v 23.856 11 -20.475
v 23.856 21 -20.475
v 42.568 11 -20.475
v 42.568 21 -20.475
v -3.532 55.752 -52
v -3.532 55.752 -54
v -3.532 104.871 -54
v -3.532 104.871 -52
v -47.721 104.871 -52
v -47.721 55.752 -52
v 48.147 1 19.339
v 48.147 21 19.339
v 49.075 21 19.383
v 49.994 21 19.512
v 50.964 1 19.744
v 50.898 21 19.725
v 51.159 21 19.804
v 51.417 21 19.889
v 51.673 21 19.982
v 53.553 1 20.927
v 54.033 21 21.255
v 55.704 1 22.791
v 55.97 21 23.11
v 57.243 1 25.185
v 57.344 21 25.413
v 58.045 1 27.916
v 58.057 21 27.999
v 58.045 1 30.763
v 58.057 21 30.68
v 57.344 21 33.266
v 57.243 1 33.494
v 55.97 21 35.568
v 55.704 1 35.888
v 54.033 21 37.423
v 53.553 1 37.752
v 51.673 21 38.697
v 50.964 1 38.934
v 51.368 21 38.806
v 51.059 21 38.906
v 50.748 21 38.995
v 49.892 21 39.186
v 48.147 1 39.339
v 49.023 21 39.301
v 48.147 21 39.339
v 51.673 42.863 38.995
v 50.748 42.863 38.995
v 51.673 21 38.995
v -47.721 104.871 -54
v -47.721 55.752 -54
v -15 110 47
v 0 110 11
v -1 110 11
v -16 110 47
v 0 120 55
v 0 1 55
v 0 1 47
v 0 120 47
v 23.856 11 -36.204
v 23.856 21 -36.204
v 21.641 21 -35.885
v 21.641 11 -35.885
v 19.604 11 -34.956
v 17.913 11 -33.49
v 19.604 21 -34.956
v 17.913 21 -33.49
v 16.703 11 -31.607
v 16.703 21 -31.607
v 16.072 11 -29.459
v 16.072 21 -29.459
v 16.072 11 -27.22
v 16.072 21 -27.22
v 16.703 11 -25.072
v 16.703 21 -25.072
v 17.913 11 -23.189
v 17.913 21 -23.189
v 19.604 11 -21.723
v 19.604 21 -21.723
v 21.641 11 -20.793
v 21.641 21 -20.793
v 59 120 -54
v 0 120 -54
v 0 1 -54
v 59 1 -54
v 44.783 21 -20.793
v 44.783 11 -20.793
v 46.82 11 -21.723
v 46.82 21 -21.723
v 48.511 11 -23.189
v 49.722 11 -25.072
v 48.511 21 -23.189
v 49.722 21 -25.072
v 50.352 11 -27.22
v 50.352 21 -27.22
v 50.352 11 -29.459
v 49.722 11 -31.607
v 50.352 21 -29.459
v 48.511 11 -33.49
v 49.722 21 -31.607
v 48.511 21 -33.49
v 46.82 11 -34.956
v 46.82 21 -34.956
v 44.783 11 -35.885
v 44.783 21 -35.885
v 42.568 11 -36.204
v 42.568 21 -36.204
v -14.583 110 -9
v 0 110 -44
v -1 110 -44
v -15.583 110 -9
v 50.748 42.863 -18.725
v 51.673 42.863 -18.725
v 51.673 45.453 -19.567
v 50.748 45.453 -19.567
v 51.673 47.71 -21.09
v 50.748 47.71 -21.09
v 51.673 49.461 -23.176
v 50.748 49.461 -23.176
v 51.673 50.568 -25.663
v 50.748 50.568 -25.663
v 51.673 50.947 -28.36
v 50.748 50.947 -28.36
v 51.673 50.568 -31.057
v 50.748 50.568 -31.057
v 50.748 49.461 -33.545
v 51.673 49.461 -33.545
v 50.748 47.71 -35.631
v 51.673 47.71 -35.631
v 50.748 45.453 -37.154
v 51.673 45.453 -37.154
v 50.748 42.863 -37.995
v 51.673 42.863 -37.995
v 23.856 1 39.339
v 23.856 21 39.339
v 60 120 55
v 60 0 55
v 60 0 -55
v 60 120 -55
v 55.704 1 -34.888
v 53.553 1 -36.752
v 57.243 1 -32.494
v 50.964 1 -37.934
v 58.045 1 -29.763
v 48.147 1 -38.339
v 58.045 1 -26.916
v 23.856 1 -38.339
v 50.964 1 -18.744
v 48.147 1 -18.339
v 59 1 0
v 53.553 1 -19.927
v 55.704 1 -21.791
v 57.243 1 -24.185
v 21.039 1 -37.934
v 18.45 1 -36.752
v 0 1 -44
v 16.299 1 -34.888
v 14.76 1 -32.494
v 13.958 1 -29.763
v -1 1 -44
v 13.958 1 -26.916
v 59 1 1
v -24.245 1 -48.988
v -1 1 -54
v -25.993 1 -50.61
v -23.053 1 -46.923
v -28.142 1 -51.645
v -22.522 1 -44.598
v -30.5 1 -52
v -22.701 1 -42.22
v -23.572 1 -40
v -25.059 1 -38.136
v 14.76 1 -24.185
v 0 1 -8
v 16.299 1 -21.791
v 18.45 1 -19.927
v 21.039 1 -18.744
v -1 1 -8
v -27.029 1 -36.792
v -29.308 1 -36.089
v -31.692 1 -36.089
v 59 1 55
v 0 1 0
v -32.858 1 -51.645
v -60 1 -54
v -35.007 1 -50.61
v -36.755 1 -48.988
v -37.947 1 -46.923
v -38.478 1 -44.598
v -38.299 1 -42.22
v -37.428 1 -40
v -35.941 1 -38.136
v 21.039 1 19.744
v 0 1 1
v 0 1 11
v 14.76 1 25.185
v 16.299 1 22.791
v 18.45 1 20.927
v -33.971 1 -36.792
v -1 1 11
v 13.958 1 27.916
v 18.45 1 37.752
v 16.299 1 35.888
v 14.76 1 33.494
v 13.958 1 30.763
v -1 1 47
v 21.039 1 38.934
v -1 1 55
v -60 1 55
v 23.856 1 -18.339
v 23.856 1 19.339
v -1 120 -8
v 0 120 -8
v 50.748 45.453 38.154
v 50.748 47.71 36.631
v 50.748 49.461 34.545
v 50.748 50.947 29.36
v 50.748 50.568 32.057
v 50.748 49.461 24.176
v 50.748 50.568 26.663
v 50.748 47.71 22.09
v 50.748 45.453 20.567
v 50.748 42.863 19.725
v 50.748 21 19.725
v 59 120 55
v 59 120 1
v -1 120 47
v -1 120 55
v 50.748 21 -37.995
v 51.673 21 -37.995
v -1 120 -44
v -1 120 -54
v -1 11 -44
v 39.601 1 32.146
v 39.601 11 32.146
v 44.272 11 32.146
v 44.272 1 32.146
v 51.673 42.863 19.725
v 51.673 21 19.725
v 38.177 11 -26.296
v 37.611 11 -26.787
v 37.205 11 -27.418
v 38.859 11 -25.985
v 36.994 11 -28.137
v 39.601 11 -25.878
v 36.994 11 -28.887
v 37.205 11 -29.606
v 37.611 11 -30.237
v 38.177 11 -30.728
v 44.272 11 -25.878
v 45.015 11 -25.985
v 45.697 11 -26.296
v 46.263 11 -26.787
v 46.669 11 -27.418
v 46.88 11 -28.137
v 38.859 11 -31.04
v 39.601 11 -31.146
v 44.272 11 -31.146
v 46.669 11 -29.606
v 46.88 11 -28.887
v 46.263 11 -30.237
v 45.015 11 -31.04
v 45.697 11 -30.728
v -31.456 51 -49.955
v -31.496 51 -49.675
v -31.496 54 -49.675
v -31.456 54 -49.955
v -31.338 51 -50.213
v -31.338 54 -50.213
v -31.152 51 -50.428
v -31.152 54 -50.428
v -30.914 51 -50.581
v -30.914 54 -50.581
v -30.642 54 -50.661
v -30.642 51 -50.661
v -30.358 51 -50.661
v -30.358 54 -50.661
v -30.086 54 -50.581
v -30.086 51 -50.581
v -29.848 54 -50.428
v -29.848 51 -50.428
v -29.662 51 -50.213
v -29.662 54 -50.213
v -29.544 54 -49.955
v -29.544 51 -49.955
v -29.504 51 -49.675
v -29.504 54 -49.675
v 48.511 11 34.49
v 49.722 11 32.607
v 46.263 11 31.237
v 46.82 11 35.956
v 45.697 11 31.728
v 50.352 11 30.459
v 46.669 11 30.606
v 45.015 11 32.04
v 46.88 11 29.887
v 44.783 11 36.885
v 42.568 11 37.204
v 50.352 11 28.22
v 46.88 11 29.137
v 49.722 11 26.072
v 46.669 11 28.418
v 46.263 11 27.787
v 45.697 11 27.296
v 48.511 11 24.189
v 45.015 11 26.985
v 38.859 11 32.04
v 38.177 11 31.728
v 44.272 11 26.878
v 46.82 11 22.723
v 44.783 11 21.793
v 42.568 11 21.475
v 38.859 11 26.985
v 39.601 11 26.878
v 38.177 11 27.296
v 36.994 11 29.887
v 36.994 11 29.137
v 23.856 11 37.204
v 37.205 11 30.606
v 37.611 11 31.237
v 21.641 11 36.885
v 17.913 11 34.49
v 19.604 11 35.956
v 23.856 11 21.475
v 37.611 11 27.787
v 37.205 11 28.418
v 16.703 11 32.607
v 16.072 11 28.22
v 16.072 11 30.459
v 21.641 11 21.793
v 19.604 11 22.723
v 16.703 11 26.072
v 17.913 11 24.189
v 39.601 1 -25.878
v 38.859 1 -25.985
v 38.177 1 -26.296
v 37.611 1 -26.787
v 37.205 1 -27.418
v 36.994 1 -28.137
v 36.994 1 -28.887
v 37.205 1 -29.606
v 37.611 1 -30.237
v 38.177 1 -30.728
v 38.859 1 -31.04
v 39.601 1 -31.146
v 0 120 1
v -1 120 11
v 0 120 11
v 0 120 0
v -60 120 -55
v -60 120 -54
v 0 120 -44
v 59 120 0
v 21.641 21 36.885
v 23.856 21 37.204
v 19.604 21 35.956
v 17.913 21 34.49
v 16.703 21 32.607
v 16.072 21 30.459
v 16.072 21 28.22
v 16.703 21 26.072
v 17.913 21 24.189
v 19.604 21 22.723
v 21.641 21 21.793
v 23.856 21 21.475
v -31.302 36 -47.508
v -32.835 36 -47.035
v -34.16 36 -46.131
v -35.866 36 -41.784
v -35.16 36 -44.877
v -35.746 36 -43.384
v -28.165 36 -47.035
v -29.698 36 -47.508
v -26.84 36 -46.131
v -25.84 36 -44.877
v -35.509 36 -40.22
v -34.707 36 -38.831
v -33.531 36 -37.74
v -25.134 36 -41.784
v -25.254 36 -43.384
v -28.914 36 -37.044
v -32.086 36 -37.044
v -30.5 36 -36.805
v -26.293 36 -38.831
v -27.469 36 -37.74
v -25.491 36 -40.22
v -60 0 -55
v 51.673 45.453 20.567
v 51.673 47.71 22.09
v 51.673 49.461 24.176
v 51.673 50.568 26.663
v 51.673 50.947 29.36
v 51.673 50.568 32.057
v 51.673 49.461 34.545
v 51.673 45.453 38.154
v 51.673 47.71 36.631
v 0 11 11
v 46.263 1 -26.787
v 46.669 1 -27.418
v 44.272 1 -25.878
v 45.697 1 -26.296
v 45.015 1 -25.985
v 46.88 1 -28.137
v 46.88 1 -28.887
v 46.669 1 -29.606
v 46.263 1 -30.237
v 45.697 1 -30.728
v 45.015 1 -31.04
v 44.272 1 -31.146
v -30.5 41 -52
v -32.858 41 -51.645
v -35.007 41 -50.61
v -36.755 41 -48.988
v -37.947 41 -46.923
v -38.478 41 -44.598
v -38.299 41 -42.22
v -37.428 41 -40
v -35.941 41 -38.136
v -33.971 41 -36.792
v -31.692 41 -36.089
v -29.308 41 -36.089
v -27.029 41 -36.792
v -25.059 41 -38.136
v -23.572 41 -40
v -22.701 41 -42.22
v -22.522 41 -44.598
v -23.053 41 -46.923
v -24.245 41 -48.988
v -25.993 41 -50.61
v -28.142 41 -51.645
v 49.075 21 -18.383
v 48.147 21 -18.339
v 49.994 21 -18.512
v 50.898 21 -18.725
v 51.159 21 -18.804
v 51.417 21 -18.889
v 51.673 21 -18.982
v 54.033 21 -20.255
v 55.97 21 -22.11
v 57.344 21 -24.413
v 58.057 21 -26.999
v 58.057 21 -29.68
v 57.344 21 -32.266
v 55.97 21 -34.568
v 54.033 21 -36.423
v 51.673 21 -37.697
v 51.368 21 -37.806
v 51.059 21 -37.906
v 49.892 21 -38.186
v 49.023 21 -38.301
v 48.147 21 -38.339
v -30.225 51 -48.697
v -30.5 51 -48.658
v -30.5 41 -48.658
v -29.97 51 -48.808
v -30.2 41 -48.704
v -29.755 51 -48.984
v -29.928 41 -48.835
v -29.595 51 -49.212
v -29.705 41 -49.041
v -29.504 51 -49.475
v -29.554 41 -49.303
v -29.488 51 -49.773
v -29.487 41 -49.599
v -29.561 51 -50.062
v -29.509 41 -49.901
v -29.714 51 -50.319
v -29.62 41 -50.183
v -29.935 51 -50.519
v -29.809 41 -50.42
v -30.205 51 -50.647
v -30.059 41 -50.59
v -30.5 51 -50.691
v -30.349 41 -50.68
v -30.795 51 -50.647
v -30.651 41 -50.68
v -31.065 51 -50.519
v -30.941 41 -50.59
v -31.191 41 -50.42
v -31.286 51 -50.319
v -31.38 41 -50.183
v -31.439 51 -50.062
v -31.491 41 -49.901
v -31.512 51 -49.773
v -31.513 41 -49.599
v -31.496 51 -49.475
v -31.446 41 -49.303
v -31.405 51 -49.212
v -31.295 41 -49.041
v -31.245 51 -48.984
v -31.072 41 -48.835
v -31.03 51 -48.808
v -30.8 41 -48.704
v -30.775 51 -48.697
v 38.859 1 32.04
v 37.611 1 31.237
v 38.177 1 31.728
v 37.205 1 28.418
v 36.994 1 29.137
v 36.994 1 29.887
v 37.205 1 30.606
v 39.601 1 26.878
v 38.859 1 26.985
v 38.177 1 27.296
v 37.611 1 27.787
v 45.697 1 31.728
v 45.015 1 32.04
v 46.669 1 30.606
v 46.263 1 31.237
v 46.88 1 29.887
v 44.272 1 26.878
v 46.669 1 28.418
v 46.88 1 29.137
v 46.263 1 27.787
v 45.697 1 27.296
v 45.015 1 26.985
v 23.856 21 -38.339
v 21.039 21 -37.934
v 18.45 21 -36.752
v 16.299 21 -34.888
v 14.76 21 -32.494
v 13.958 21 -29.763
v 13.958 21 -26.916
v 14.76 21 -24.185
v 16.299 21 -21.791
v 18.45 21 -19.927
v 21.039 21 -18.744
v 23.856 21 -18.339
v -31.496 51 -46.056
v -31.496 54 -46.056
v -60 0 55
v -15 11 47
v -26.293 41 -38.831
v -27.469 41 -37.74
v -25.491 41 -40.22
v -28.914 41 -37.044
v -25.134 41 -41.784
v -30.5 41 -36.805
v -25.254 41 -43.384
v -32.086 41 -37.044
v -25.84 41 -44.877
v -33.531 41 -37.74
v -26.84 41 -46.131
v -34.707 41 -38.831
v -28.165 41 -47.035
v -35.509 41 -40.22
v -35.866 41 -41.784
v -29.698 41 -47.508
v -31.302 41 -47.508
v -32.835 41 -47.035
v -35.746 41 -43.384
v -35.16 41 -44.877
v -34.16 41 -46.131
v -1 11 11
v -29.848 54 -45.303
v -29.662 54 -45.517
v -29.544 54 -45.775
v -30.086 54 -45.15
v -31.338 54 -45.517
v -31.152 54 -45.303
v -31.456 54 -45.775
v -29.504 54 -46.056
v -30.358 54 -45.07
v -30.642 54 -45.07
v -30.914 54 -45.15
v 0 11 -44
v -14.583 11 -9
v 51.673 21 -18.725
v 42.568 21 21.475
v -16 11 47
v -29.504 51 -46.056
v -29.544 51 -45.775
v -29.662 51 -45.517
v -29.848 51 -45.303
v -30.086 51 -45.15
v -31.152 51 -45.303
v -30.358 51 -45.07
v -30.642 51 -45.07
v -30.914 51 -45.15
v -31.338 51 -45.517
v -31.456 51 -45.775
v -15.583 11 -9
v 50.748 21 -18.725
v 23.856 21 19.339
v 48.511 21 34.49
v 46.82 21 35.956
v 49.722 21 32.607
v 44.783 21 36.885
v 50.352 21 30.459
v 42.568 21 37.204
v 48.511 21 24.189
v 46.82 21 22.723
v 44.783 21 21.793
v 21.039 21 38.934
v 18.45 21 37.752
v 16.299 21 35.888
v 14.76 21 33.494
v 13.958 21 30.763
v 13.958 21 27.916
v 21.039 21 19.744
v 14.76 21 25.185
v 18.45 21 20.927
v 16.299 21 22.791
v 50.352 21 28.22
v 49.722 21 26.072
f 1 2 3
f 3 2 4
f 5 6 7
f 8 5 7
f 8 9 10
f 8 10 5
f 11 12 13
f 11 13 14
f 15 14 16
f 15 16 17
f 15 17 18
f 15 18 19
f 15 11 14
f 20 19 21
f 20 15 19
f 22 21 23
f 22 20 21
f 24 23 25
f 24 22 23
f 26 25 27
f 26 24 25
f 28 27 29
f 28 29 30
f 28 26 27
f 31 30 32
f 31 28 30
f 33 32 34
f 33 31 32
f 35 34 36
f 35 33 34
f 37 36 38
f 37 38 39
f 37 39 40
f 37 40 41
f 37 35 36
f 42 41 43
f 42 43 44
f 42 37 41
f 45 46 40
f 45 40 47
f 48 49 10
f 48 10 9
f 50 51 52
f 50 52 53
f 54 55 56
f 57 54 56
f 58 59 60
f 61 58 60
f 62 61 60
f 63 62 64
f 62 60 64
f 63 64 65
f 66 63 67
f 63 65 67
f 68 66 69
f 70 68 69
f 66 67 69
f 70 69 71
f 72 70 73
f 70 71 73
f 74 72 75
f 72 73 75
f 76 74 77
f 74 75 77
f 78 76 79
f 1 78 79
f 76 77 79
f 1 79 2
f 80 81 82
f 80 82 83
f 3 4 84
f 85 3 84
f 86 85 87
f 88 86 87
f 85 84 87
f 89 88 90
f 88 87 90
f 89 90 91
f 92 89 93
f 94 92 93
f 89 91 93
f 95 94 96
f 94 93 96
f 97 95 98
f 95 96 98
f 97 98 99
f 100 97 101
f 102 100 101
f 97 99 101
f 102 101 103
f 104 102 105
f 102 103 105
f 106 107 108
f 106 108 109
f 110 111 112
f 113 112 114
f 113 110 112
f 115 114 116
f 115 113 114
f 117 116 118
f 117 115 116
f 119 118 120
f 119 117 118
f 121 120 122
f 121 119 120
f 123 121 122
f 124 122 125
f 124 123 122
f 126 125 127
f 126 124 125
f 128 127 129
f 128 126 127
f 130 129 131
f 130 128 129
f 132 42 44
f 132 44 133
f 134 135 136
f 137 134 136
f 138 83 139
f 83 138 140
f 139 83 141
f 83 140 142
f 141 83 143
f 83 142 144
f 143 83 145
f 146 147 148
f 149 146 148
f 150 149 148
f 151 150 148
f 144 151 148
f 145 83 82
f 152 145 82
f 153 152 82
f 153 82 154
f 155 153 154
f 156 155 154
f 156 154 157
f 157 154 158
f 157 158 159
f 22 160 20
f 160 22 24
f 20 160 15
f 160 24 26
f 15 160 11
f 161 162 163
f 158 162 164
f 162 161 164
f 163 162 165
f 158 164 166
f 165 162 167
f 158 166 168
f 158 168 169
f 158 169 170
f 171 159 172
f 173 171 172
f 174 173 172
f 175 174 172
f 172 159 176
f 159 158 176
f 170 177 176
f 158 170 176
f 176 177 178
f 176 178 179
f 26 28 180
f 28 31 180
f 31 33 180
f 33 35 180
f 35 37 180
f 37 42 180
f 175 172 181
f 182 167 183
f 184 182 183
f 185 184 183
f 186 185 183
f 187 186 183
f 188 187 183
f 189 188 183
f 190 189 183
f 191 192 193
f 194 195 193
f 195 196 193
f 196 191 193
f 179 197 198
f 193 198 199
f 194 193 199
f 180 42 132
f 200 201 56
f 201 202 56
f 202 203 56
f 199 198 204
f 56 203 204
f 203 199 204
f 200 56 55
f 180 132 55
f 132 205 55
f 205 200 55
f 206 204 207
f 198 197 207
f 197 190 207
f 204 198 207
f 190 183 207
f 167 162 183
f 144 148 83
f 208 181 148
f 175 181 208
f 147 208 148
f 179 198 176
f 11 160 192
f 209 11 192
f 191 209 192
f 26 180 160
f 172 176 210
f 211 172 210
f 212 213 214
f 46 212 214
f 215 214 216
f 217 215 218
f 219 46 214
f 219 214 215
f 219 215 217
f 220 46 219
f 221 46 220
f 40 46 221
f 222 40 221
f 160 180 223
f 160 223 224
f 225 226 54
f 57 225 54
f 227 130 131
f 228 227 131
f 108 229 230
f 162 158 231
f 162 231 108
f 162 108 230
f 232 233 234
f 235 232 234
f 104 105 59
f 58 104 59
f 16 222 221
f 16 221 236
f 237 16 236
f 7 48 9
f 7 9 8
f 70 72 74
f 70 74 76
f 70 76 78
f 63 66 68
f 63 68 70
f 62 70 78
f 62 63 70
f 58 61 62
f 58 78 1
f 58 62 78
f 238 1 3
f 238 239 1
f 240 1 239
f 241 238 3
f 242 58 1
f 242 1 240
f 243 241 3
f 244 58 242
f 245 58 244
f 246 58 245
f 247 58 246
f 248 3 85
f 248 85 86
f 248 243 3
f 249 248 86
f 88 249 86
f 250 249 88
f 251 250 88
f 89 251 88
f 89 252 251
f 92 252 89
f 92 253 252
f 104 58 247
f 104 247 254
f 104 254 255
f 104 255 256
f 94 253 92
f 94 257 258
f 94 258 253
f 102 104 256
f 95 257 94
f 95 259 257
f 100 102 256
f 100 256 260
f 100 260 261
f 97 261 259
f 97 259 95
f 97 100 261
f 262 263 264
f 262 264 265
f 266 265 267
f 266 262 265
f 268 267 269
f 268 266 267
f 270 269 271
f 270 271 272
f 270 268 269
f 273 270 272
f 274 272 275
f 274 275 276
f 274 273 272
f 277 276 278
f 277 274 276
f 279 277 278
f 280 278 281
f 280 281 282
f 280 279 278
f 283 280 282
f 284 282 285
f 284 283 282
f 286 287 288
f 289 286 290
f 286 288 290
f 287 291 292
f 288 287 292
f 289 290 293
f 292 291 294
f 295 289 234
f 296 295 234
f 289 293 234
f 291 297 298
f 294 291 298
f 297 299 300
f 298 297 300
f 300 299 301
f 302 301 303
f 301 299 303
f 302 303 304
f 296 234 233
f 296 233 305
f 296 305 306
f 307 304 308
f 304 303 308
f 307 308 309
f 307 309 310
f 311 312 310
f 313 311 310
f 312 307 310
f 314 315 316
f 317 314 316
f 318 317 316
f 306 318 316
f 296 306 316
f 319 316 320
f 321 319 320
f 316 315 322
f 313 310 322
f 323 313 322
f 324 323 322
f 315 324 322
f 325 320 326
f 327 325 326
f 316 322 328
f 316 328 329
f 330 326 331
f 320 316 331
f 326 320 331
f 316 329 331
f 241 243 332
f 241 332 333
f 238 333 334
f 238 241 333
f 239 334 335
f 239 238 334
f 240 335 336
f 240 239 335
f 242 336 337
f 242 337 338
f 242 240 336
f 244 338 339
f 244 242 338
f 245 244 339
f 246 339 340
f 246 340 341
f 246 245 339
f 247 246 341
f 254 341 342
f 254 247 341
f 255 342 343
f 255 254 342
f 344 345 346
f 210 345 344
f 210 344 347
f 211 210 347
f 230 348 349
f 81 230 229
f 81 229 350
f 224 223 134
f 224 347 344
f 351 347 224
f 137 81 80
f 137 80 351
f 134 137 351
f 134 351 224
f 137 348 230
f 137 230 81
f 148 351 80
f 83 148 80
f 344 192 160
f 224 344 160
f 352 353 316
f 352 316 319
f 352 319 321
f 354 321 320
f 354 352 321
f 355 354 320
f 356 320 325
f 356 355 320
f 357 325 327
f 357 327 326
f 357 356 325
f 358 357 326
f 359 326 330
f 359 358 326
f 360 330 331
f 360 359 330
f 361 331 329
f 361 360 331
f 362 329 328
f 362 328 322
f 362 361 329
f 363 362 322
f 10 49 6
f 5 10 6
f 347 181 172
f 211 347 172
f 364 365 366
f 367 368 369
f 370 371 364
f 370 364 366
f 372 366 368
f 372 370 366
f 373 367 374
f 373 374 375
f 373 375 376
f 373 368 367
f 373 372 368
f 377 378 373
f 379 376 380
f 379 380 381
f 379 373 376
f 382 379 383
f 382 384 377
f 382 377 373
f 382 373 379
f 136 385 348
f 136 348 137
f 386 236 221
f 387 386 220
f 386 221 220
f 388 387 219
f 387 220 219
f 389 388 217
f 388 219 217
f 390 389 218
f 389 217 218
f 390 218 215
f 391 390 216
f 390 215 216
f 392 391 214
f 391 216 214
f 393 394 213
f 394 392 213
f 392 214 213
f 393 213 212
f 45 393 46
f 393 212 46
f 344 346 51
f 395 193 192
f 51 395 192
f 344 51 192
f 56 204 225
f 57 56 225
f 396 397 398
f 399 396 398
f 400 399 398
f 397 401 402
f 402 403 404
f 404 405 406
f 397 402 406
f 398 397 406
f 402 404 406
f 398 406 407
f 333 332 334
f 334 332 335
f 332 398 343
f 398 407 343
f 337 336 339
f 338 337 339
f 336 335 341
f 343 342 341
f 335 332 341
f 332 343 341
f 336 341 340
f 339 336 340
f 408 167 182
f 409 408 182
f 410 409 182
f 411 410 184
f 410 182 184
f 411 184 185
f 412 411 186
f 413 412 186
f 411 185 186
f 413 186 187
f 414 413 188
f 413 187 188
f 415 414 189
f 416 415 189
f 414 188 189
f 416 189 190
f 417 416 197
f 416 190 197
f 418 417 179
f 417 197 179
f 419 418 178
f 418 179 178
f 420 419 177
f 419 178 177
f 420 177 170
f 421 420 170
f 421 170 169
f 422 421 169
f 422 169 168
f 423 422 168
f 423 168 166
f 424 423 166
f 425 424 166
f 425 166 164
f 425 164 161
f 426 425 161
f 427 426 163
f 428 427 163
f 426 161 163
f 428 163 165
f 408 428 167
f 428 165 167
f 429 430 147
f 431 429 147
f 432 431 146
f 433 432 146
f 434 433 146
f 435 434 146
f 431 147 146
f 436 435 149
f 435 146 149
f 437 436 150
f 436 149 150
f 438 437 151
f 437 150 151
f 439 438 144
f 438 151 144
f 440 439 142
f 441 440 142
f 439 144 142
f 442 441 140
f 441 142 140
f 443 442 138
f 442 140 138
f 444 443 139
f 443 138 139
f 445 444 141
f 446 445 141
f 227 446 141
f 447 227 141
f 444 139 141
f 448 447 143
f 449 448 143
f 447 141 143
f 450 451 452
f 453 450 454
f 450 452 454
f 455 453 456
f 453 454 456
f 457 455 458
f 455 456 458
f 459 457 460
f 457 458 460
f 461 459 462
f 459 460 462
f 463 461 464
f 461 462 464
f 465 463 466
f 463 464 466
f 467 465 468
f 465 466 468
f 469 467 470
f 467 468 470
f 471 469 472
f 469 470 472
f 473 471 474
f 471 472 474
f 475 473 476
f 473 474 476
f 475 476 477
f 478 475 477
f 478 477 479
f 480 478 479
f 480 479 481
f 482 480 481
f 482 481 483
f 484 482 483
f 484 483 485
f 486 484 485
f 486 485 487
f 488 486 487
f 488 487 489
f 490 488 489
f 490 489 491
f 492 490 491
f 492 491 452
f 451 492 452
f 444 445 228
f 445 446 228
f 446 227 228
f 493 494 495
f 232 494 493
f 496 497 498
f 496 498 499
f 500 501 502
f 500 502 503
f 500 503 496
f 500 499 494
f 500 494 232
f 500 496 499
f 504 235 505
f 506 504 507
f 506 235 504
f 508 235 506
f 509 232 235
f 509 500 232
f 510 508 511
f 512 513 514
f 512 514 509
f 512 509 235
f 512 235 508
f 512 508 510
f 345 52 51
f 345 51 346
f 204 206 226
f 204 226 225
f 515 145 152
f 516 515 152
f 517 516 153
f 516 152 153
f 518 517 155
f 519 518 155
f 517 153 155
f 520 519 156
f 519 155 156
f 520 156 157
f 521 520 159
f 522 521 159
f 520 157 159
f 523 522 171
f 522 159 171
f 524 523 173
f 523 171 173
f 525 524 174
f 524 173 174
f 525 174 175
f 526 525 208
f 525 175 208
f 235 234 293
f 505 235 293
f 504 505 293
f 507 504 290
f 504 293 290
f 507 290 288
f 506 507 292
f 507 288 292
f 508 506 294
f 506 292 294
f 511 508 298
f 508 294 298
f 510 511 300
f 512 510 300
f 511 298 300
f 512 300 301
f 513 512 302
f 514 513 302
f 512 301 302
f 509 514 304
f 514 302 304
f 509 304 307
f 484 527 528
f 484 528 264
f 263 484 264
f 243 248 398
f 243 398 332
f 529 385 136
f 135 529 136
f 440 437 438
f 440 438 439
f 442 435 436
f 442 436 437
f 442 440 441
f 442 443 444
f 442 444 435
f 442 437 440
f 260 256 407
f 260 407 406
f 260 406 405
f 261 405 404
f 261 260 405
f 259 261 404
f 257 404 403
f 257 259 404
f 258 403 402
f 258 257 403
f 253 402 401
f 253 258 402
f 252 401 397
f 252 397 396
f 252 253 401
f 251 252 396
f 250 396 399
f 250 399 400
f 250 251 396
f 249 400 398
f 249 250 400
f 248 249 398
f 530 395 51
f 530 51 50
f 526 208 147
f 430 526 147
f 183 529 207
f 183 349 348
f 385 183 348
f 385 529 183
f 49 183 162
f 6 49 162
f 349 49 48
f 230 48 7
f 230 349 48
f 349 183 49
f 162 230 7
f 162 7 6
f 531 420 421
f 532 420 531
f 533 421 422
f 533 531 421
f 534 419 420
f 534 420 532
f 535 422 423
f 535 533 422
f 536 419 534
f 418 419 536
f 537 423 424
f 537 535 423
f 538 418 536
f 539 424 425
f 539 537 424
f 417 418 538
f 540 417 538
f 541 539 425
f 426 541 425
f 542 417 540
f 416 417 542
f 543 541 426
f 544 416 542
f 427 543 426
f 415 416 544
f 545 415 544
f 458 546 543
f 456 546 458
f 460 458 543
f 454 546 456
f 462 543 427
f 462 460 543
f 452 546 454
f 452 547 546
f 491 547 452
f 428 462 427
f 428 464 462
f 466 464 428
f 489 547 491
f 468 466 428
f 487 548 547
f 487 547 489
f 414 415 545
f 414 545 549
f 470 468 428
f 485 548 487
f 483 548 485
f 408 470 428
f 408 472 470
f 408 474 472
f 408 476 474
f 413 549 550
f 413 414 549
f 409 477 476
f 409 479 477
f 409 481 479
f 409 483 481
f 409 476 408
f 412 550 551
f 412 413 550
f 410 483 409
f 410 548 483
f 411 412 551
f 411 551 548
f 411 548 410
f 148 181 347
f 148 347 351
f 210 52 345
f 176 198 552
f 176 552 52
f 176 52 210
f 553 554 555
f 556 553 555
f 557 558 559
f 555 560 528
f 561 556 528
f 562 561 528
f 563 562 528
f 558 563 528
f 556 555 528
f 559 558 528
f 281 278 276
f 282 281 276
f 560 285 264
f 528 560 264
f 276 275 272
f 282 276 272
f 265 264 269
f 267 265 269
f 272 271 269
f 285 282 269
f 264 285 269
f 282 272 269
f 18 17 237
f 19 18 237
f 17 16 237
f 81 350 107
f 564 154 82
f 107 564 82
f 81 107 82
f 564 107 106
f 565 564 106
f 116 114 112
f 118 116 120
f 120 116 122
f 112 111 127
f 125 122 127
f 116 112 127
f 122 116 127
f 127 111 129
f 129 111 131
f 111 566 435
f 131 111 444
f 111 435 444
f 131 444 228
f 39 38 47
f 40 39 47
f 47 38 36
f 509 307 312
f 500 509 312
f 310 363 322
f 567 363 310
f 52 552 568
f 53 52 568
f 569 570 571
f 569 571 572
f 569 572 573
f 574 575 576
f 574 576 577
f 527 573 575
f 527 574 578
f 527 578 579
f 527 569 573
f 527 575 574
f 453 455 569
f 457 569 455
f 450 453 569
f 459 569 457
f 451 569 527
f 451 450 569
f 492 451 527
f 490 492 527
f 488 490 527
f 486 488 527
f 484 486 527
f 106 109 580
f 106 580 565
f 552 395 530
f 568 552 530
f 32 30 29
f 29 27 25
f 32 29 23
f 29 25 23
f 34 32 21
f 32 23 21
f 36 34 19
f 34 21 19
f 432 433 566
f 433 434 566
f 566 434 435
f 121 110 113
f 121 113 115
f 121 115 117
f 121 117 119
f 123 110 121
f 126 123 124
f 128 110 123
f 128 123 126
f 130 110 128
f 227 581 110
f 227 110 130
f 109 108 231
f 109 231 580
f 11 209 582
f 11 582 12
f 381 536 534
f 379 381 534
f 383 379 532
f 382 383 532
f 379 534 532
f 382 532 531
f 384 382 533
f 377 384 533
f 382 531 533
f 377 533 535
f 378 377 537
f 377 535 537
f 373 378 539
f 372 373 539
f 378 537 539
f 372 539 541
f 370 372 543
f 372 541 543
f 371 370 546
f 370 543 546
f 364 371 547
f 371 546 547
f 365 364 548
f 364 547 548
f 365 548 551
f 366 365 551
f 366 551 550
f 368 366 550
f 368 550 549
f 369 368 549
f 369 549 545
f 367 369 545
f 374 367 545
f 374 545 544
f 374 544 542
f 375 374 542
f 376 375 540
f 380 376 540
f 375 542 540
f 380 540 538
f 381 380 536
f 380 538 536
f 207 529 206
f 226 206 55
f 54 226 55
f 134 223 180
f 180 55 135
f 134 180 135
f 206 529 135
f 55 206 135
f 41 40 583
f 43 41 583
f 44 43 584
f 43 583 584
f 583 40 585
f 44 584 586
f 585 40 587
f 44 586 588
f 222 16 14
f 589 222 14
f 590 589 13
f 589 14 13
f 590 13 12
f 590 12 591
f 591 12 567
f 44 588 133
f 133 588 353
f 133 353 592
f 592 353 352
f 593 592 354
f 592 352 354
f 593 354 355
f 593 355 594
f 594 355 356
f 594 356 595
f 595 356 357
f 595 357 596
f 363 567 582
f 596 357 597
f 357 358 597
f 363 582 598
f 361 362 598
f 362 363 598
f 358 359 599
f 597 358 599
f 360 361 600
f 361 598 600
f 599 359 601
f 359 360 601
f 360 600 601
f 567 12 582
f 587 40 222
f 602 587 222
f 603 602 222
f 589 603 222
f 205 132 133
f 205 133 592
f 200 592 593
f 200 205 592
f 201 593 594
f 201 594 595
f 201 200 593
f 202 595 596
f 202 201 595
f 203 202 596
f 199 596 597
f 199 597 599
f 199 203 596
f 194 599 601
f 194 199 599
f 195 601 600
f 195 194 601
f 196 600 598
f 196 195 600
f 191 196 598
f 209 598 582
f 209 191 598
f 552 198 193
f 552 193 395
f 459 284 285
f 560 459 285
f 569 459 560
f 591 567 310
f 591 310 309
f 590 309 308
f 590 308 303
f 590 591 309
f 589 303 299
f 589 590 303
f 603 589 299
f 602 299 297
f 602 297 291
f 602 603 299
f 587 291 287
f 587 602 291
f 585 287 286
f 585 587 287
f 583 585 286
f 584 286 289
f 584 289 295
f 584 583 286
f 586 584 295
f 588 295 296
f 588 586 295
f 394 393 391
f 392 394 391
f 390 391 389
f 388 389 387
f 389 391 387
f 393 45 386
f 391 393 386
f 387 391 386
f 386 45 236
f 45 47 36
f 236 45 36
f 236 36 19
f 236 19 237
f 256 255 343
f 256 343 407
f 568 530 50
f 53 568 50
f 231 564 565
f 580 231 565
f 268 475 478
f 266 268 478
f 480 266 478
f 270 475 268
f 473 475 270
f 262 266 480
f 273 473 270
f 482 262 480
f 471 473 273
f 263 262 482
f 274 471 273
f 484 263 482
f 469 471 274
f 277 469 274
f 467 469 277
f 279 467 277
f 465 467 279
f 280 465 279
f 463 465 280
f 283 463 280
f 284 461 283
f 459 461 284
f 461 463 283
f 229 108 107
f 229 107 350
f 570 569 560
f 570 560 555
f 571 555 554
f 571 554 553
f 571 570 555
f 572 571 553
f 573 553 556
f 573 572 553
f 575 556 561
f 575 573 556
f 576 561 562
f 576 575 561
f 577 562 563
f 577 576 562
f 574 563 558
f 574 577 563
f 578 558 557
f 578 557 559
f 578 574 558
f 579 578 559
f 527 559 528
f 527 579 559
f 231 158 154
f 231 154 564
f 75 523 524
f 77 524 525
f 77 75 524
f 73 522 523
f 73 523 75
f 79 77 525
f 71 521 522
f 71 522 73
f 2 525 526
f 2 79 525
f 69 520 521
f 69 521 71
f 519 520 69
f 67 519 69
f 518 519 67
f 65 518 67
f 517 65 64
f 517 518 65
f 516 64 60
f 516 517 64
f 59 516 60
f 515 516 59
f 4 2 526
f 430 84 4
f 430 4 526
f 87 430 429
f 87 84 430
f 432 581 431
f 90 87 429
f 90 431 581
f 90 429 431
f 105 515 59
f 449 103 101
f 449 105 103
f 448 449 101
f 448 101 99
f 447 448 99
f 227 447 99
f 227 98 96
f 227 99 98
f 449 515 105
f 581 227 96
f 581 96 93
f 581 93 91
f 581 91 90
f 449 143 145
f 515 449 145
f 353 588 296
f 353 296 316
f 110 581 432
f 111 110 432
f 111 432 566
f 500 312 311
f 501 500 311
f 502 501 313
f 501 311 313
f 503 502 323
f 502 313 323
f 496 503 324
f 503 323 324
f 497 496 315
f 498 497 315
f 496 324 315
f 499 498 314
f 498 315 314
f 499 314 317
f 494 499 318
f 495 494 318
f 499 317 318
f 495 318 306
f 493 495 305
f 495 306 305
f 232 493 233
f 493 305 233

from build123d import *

# Parameters (mm, degrees)
SKETCH_1_W           = 120
SKETCH_1_H           = 110
EXTRUDE_2_DEPTH      = 120
SKETCH_2_W           = 118
SKETCH_2_H           = 118
CUT_EXTRUDE_1_DEPTH  = 109
SKETCH_5_W           = 109
SKETCH_5_H           = 118
CUT_EXTRUDE_2_DEPTH  = 109
SKETCH_6_W           = 119
SKETCH_6_H           = 109
CUT_EXTRUDE_3_DEPTH  = 109
SKETCH_7_W           = 1
SKETCH_7_H           = 109
EXTRUDE_3_DEPTH      = 119
SKETCH_8_W           = 119
SKETCH_8_H           = 1
EXTRUDE_5_DEPTH      = 119
SKETCH_9_W           = 36
SKETCH_9_H           = 10
CUT_EXTRUDE_4_DEPTH  = 39
SKETCH_11_W          = 36
SKETCH_11_H          = 10
CUT_EXTRUDE_5_DEPTH  = 39
SKETCH_12_W          = 36
SKETCH_12_H          = 99
EXTRUDE_6_DEPTH      = 30
CUT_EXTRUDE_6_DEPTH  = 100
SKETCH_14_W          = 36
SKETCH_14_H          = 99
EXTRUDE_7_DEPTH      = 30
CUT_EXTRUDE_7_DEPTH  = 100
EXTRUDE_9_DEPTH      = 20
CUT_EXTRUDE_8_DEPTH  = 10
CUT_EXTRUDE_9_DEPTH  = 10
SKETCH_22_W          = 0.925592825
SKETCH_22_H          = 19.270027161
EXTRUDE_10_DEPTH     = 30
CUT_EXTRUDE_14_DEPTH = 5
SKETCH_27_R          = 8
EXTRUDE_14_DEPTH     = 40
SKETCH_29_R          = 5.381413495
CUT_EXTRUDE_15_DEPTH = 5
SKETCH_30_R          = 1.016249725
EXTRUDE_15_DEPTH     = 10
EXTRUDE_16_DEPTH     = 3
SKETCH_32_W          = 44.189123475
SKETCH_32_H          = 49.118532685
EXTRUDE_17_DEPTH     = 2
SKETCH_33_W          = 59
SKETCH_33_H          = 119
CUT_EXTRUDE_16_DEPTH = 10


with BuildPart() as part:
    # 스케치1 → 보스-돌출2 (new body)
    with BuildSketch(Plane(origin=(0, 0, 0), x_dir=(1, 0, 0), z_dir=(0, 1, 0))):
        Rectangle(SKETCH_1_W, SKETCH_1_H)
    extrude(amount=EXTRUDE_2_DEPTH)

    # 스케치2 → 컷-돌출1 (cut)
    with BuildSketch(Plane.XY.offset(55)):
        with Locations((0, 60)):
            Rectangle(SKETCH_2_W, SKETCH_2_H)
    extrude(amount=-CUT_EXTRUDE_1_DEPTH, mode=Mode.SUBTRACT)

    # 스케치5 → 컷-돌출2 (cut)
    with BuildSketch(Plane.ZY.offset(60)):
        with Locations((0.5, 60)):
            Rectangle(SKETCH_5_W, SKETCH_5_H)
    extrude(amount=-CUT_EXTRUDE_2_DEPTH, mode=Mode.SUBTRACT)

    # 스케치6 → 컷-돌출3 (cut)
    with BuildSketch(Plane(origin=(0, 120, 0), x_dir=(1, 0, 0), z_dir=(0, 1, 0))):
        with Locations((-0.5, -0.5)):
            Rectangle(SKETCH_6_W, SKETCH_6_H)
    extrude(amount=-CUT_EXTRUDE_3_DEPTH, mode=Mode.SUBTRACT)

    # 스케치7 → 보스-돌출3 (add)
    with BuildSketch(Plane(origin=(0, 1, 0), x_dir=(1, 0, 0), z_dir=(0, 1, 0))):
        with Locations((-0.5, -0.5)):
            Rectangle(SKETCH_7_W, SKETCH_7_H)
    extrude(amount=EXTRUDE_3_DEPTH)

    # 스케치8 → 보스-돌출5 (add)
    with BuildSketch(Plane(origin=(0, 1, 0), x_dir=(1, 0, 0), z_dir=(0, 1, 0))):
        with Locations((-0.5, -0.5)):
            Rectangle(SKETCH_8_W, SKETCH_8_H)
    extrude(amount=EXTRUDE_5_DEPTH)

    # 스케치9 → 컷-돌출4 (cut)
    with BuildSketch(Plane.ZY.offset(1)):
        with Locations((-26, 115)):
            Rectangle(SKETCH_9_W, SKETCH_9_H)
        with Locations((-26, 6)):
            Rectangle(SKETCH_9_W, SKETCH_9_H)
    extrude(amount=-CUT_EXTRUDE_4_DEPTH, mode=Mode.SUBTRACT)

    # 스케치11 → 컷-돌출5 (cut)
    with BuildSketch(Plane.ZY.offset(1)):
        with Locations((29, 115)):
            Rectangle(SKETCH_11_W, SKETCH_11_H)
        with Locations((29, 6)):
            Rectangle(SKETCH_11_W, SKETCH_11_H)
    extrude(amount=-CUT_EXTRUDE_5_DEPTH, mode=Mode.SUBTRACT)

    # 스케치12 → 보스-돌출6 (add)
    with BuildSketch(Plane.ZY.offset(1)):
        with Locations((-26, 60.5)):
            Rectangle(SKETCH_12_W, SKETCH_12_H)
    extrude(amount=EXTRUDE_6_DEPTH)

    # 스케치13 → 컷-돌출6 (cut)
    with BuildSketch(Plane(origin=(0, 110, 0), x_dir=(1, 0, 0), z_dir=(0, 1, 0))):
        Polygon((-1, 44), (-16, 8), (-31, 8), (-31, 44), align=None)
        Polygon((0, 44), (-15, 8), (0, 8), align=None)
    extrude(amount=-CUT_EXTRUDE_6_DEPTH, mode=Mode.SUBTRACT)

    # 스케치14 → 보스-돌출7 (add)
    with BuildSketch(Plane.ZY.offset(1)):
        with Locations((29, 60.5)):
            Rectangle(SKETCH_14_W, SKETCH_14_H)
    extrude(amount=EXTRUDE_7_DEPTH)

    # 스케치15 → 컷-돌출7 (cut)
    with BuildSketch(Plane(origin=(0, 110, 0), x_dir=(1, 0, 0), z_dir=(0, 1, 0))):
        Polygon((-1, -11), (-16, -47), (-31, -47), (-31, -11), align=None)
        Polygon((0, -11), (-15, -47), (0, -47), align=None)
    extrude(amount=-CUT_EXTRUDE_7_DEPTH, mode=Mode.SUBTRACT)

    # 스케치16 → 보스-돌출9 (add)
    with BuildSketch(Plane(origin=(0, 1, 0), x_dir=(1, 0, 0), z_dir=(0, 1, 0))):
        with BuildLine():
            Line((48.146914235, -39.33942453), (23.856416777, -39.33942453))
            ThreePointArc((23.856416777, -39.33942453), (13.856416777, -29.33942453), (23.856416777, -19.33942453))
            Line((23.856416777, -19.33942453), (48.146914235, -19.33942453))
            ThreePointArc((48.146914235, -19.33942453), (58.146914235, -29.33942453), (48.146914235, -39.33942453))
        make_face()
        with BuildLine():
            Line((48.146914235, 38.33942453), (23.856416777, 38.33942453))
            ThreePointArc((23.856416777, 38.33942453), (13.856416777, 28.33942453), (23.856416777, 18.33942453))
            Line((23.856416777, 18.33942453), (48.146914235, 18.33942453))
            ThreePointArc((48.146914235, 18.33942453), (58.146914235, 28.33942453), (48.146914235, 38.33942453))
        make_face()
    extrude(amount=EXTRUDE_9_DEPTH)

    # 스케치17 → 컷-돌출8 (cut)
    with BuildSketch(Plane(origin=(0, 21, 0), x_dir=(1, 0, 0), z_dir=(0, 1, 0))):
        with BuildLine():
            Line((23.856416777, -21.474798149), (42.567688879, -21.474798149))
            ThreePointArc((42.567688879, -21.474798149), (50.43231526, -29.33942453), (42.567688879, -37.204050911))
            Line((42.567688879, -37.204050911), (23.856416777, -37.204050911))
            ThreePointArc((23.856416777, -37.204050911), (15.991790397, -29.33942453), (23.856416777, -21.474798149))
        make_face()
        with BuildLine():
            Line((23.856416777, 20.474798149), (42.567688879, 20.474798149))
            ThreePointArc((42.567688879, 20.474798149), (50.43231526, 28.33942453), (42.567688879, 36.204050911))
            Line((42.567688879, 36.204050911), (23.856416777, 36.204050911))
            ThreePointArc((23.856416777, 36.204050911), (15.991790397, 28.33942453), (23.856416777, 20.474798149))
        make_face()
    extrude(amount=-CUT_EXTRUDE_8_DEPTH, mode=Mode.SUBTRACT)

    # 스케치19 → 컷-돌출9 (cut)
    with BuildSketch(Plane(origin=(0, 11, 0), x_dir=(1, 0, 0), z_dir=(0, 1, 0))):
        with BuildLine():
            Line((39.6013509, 31.146236018), (44.272476327, 31.146236018))
            ThreePointArc((44.272476327, 31.146236018), (46.906569613, 28.512142732), (44.272476327, 25.878049447))
            Line((44.272476327, 25.878049447), (39.6013509, 25.878049447))
            ThreePointArc((39.6013509, 25.878049447), (36.967257615, 28.512142732), (39.6013509, 31.146236018))
        make_face()
        with BuildLine():
            Line((39.6013509, -32.146236018), (44.272476327, -32.146236018))
            ThreePointArc((44.272476327, -32.146236018), (46.906569613, -29.512142732), (44.272476327, -26.878049447))
            Line((44.272476327, -26.878049447), (39.6013509, -26.878049447))
            ThreePointArc((39.6013509, -26.878049447), (36.967257615, -29.512142732), (39.6013509, -32.146236018))
        make_face()
    extrude(amount=-CUT_EXTRUDE_9_DEPTH, mode=Mode.SUBTRACT)

    # 스케치22 → 보스-돌출10 (add)
    with BuildSketch(Plane(origin=(0, 21, 0), x_dir=(1, 0, 0), z_dir=(0, 1, 0))):
        with Locations((51.210576598, -29.360263905)):
            Rectangle(SKETCH_22_W, SKETCH_22_H)
        with Locations((51.210576598, 28.360263905)):
            Rectangle(SKETCH_22_W, SKETCH_22_H)
    extrude(amount=EXTRUDE_10_DEPTH)

    # 스케치26 → 컷-돌출14 (cut)
    with BuildSketch(Plane.ZY.offset(-50.747780185)):
        with BuildLine():
            Line((19.725250325, 51), (19.725250325, 42.862531911))
            ThreePointArc((19.725250325, 42.862531911), (29.360263905, 50.947462847), (38.995277486, 42.862531911))
            Line((38.995277486, 42.862531911), (38.995277486, 51))
            Line((38.995277486, 51), (19.725250325, 51))
        make_face()
        with BuildLine():
            Line((-38.143872213, 41.16385454), (-38.143872213, 57.416257422))
            Line((-38.143872213, 57.416257422), (-18.576655598, 57.416257422))
            Line((-18.576655598, 57.416257422), (-18.576655598, 41.16385454))
            ThreePointArc((-18.576655598, 41.16385454), (-28.360263905, 50.947462847), (-38.143872213, 41.16385454))
        make_face()
    extrude(amount=-CUT_EXTRUDE_14_DEPTH, mode=Mode.SUBTRACT)

    # 스케치27 → 보스-돌출14 (add)
    with BuildSketch(Plane(origin=(0, 1, 0), x_dir=(1, 0, 0), z_dir=(0, 1, 0))):
        with Locations(Location((-30.5, 44, 0), (0, 0, 90))):
            Circle(SKETCH_27_R)
    extrude(amount=EXTRUDE_14_DEPTH)

    # 스케치29 → 컷-돌출15 (cut)
    with BuildSketch(Plane(origin=(0, 41, 0), x_dir=(1, 0, 0), z_dir=(0, 1, 0))):
        with Locations(Location((-30.5, 42.18650453, 0), (0, 0, 270))):
            Circle(SKETCH_29_R)
    extrude(amount=-CUT_EXTRUDE_15_DEPTH, mode=Mode.SUBTRACT)

    # 스케치30 → 보스-돌출15 (add)
    with BuildSketch(Plane(origin=(0, 41, 0), x_dir=(1, 0, 0), z_dir=(0, 1, 0))):
        with Locations(Location((-30.5, 49.674732838, 0), (0, 0, 270))):
            Circle(SKETCH_30_R)
    extrude(amount=EXTRUDE_15_DEPTH)

    # 스케치31 → 보스-돌출16 (add)
    with BuildSketch(Plane(origin=(0, 51, 0), x_dir=(1, 0, 0), z_dir=(0, 1, 0))):
        with BuildLine():
            Line((-29.503658446, 49.674732838), (-29.503658446, 46.055904325))
            ThreePointArc((-29.503658446, 46.055904325), (-30.5, 45.059562771), (-31.496341554, 46.055904325))
            Line((-31.496341554, 46.055904325), (-31.496341554, 49.674732838))
            ThreePointArc((-31.496341554, 49.674732838), (-30.5, 50.671074391), (-29.503658446, 49.674732838))
        make_face()
    extrude(amount=EXTRUDE_16_DEPTH)

    # 스케치32 → 보스-돌출17 (add)
    with BuildSketch(Plane.XY.offset(-54)):
        with Locations((-25.626680732, 80.311397781)):
            Rectangle(SKETCH_32_W, SKETCH_32_H)
    extrude(amount=EXTRUDE_17_DEPTH)

    # 스케치33 → 컷-돌출16 (cut)
    with BuildSketch(Plane.XY.offset(1)):
        with Locations((-30.5, 60.5)):
            Rectangle(SKETCH_33_W, SKETCH_33_H)
    extrude(amount=-CUT_EXTRUDE_16_DEPTH, mode=Mode.SUBTRACT)


solid = part.part
